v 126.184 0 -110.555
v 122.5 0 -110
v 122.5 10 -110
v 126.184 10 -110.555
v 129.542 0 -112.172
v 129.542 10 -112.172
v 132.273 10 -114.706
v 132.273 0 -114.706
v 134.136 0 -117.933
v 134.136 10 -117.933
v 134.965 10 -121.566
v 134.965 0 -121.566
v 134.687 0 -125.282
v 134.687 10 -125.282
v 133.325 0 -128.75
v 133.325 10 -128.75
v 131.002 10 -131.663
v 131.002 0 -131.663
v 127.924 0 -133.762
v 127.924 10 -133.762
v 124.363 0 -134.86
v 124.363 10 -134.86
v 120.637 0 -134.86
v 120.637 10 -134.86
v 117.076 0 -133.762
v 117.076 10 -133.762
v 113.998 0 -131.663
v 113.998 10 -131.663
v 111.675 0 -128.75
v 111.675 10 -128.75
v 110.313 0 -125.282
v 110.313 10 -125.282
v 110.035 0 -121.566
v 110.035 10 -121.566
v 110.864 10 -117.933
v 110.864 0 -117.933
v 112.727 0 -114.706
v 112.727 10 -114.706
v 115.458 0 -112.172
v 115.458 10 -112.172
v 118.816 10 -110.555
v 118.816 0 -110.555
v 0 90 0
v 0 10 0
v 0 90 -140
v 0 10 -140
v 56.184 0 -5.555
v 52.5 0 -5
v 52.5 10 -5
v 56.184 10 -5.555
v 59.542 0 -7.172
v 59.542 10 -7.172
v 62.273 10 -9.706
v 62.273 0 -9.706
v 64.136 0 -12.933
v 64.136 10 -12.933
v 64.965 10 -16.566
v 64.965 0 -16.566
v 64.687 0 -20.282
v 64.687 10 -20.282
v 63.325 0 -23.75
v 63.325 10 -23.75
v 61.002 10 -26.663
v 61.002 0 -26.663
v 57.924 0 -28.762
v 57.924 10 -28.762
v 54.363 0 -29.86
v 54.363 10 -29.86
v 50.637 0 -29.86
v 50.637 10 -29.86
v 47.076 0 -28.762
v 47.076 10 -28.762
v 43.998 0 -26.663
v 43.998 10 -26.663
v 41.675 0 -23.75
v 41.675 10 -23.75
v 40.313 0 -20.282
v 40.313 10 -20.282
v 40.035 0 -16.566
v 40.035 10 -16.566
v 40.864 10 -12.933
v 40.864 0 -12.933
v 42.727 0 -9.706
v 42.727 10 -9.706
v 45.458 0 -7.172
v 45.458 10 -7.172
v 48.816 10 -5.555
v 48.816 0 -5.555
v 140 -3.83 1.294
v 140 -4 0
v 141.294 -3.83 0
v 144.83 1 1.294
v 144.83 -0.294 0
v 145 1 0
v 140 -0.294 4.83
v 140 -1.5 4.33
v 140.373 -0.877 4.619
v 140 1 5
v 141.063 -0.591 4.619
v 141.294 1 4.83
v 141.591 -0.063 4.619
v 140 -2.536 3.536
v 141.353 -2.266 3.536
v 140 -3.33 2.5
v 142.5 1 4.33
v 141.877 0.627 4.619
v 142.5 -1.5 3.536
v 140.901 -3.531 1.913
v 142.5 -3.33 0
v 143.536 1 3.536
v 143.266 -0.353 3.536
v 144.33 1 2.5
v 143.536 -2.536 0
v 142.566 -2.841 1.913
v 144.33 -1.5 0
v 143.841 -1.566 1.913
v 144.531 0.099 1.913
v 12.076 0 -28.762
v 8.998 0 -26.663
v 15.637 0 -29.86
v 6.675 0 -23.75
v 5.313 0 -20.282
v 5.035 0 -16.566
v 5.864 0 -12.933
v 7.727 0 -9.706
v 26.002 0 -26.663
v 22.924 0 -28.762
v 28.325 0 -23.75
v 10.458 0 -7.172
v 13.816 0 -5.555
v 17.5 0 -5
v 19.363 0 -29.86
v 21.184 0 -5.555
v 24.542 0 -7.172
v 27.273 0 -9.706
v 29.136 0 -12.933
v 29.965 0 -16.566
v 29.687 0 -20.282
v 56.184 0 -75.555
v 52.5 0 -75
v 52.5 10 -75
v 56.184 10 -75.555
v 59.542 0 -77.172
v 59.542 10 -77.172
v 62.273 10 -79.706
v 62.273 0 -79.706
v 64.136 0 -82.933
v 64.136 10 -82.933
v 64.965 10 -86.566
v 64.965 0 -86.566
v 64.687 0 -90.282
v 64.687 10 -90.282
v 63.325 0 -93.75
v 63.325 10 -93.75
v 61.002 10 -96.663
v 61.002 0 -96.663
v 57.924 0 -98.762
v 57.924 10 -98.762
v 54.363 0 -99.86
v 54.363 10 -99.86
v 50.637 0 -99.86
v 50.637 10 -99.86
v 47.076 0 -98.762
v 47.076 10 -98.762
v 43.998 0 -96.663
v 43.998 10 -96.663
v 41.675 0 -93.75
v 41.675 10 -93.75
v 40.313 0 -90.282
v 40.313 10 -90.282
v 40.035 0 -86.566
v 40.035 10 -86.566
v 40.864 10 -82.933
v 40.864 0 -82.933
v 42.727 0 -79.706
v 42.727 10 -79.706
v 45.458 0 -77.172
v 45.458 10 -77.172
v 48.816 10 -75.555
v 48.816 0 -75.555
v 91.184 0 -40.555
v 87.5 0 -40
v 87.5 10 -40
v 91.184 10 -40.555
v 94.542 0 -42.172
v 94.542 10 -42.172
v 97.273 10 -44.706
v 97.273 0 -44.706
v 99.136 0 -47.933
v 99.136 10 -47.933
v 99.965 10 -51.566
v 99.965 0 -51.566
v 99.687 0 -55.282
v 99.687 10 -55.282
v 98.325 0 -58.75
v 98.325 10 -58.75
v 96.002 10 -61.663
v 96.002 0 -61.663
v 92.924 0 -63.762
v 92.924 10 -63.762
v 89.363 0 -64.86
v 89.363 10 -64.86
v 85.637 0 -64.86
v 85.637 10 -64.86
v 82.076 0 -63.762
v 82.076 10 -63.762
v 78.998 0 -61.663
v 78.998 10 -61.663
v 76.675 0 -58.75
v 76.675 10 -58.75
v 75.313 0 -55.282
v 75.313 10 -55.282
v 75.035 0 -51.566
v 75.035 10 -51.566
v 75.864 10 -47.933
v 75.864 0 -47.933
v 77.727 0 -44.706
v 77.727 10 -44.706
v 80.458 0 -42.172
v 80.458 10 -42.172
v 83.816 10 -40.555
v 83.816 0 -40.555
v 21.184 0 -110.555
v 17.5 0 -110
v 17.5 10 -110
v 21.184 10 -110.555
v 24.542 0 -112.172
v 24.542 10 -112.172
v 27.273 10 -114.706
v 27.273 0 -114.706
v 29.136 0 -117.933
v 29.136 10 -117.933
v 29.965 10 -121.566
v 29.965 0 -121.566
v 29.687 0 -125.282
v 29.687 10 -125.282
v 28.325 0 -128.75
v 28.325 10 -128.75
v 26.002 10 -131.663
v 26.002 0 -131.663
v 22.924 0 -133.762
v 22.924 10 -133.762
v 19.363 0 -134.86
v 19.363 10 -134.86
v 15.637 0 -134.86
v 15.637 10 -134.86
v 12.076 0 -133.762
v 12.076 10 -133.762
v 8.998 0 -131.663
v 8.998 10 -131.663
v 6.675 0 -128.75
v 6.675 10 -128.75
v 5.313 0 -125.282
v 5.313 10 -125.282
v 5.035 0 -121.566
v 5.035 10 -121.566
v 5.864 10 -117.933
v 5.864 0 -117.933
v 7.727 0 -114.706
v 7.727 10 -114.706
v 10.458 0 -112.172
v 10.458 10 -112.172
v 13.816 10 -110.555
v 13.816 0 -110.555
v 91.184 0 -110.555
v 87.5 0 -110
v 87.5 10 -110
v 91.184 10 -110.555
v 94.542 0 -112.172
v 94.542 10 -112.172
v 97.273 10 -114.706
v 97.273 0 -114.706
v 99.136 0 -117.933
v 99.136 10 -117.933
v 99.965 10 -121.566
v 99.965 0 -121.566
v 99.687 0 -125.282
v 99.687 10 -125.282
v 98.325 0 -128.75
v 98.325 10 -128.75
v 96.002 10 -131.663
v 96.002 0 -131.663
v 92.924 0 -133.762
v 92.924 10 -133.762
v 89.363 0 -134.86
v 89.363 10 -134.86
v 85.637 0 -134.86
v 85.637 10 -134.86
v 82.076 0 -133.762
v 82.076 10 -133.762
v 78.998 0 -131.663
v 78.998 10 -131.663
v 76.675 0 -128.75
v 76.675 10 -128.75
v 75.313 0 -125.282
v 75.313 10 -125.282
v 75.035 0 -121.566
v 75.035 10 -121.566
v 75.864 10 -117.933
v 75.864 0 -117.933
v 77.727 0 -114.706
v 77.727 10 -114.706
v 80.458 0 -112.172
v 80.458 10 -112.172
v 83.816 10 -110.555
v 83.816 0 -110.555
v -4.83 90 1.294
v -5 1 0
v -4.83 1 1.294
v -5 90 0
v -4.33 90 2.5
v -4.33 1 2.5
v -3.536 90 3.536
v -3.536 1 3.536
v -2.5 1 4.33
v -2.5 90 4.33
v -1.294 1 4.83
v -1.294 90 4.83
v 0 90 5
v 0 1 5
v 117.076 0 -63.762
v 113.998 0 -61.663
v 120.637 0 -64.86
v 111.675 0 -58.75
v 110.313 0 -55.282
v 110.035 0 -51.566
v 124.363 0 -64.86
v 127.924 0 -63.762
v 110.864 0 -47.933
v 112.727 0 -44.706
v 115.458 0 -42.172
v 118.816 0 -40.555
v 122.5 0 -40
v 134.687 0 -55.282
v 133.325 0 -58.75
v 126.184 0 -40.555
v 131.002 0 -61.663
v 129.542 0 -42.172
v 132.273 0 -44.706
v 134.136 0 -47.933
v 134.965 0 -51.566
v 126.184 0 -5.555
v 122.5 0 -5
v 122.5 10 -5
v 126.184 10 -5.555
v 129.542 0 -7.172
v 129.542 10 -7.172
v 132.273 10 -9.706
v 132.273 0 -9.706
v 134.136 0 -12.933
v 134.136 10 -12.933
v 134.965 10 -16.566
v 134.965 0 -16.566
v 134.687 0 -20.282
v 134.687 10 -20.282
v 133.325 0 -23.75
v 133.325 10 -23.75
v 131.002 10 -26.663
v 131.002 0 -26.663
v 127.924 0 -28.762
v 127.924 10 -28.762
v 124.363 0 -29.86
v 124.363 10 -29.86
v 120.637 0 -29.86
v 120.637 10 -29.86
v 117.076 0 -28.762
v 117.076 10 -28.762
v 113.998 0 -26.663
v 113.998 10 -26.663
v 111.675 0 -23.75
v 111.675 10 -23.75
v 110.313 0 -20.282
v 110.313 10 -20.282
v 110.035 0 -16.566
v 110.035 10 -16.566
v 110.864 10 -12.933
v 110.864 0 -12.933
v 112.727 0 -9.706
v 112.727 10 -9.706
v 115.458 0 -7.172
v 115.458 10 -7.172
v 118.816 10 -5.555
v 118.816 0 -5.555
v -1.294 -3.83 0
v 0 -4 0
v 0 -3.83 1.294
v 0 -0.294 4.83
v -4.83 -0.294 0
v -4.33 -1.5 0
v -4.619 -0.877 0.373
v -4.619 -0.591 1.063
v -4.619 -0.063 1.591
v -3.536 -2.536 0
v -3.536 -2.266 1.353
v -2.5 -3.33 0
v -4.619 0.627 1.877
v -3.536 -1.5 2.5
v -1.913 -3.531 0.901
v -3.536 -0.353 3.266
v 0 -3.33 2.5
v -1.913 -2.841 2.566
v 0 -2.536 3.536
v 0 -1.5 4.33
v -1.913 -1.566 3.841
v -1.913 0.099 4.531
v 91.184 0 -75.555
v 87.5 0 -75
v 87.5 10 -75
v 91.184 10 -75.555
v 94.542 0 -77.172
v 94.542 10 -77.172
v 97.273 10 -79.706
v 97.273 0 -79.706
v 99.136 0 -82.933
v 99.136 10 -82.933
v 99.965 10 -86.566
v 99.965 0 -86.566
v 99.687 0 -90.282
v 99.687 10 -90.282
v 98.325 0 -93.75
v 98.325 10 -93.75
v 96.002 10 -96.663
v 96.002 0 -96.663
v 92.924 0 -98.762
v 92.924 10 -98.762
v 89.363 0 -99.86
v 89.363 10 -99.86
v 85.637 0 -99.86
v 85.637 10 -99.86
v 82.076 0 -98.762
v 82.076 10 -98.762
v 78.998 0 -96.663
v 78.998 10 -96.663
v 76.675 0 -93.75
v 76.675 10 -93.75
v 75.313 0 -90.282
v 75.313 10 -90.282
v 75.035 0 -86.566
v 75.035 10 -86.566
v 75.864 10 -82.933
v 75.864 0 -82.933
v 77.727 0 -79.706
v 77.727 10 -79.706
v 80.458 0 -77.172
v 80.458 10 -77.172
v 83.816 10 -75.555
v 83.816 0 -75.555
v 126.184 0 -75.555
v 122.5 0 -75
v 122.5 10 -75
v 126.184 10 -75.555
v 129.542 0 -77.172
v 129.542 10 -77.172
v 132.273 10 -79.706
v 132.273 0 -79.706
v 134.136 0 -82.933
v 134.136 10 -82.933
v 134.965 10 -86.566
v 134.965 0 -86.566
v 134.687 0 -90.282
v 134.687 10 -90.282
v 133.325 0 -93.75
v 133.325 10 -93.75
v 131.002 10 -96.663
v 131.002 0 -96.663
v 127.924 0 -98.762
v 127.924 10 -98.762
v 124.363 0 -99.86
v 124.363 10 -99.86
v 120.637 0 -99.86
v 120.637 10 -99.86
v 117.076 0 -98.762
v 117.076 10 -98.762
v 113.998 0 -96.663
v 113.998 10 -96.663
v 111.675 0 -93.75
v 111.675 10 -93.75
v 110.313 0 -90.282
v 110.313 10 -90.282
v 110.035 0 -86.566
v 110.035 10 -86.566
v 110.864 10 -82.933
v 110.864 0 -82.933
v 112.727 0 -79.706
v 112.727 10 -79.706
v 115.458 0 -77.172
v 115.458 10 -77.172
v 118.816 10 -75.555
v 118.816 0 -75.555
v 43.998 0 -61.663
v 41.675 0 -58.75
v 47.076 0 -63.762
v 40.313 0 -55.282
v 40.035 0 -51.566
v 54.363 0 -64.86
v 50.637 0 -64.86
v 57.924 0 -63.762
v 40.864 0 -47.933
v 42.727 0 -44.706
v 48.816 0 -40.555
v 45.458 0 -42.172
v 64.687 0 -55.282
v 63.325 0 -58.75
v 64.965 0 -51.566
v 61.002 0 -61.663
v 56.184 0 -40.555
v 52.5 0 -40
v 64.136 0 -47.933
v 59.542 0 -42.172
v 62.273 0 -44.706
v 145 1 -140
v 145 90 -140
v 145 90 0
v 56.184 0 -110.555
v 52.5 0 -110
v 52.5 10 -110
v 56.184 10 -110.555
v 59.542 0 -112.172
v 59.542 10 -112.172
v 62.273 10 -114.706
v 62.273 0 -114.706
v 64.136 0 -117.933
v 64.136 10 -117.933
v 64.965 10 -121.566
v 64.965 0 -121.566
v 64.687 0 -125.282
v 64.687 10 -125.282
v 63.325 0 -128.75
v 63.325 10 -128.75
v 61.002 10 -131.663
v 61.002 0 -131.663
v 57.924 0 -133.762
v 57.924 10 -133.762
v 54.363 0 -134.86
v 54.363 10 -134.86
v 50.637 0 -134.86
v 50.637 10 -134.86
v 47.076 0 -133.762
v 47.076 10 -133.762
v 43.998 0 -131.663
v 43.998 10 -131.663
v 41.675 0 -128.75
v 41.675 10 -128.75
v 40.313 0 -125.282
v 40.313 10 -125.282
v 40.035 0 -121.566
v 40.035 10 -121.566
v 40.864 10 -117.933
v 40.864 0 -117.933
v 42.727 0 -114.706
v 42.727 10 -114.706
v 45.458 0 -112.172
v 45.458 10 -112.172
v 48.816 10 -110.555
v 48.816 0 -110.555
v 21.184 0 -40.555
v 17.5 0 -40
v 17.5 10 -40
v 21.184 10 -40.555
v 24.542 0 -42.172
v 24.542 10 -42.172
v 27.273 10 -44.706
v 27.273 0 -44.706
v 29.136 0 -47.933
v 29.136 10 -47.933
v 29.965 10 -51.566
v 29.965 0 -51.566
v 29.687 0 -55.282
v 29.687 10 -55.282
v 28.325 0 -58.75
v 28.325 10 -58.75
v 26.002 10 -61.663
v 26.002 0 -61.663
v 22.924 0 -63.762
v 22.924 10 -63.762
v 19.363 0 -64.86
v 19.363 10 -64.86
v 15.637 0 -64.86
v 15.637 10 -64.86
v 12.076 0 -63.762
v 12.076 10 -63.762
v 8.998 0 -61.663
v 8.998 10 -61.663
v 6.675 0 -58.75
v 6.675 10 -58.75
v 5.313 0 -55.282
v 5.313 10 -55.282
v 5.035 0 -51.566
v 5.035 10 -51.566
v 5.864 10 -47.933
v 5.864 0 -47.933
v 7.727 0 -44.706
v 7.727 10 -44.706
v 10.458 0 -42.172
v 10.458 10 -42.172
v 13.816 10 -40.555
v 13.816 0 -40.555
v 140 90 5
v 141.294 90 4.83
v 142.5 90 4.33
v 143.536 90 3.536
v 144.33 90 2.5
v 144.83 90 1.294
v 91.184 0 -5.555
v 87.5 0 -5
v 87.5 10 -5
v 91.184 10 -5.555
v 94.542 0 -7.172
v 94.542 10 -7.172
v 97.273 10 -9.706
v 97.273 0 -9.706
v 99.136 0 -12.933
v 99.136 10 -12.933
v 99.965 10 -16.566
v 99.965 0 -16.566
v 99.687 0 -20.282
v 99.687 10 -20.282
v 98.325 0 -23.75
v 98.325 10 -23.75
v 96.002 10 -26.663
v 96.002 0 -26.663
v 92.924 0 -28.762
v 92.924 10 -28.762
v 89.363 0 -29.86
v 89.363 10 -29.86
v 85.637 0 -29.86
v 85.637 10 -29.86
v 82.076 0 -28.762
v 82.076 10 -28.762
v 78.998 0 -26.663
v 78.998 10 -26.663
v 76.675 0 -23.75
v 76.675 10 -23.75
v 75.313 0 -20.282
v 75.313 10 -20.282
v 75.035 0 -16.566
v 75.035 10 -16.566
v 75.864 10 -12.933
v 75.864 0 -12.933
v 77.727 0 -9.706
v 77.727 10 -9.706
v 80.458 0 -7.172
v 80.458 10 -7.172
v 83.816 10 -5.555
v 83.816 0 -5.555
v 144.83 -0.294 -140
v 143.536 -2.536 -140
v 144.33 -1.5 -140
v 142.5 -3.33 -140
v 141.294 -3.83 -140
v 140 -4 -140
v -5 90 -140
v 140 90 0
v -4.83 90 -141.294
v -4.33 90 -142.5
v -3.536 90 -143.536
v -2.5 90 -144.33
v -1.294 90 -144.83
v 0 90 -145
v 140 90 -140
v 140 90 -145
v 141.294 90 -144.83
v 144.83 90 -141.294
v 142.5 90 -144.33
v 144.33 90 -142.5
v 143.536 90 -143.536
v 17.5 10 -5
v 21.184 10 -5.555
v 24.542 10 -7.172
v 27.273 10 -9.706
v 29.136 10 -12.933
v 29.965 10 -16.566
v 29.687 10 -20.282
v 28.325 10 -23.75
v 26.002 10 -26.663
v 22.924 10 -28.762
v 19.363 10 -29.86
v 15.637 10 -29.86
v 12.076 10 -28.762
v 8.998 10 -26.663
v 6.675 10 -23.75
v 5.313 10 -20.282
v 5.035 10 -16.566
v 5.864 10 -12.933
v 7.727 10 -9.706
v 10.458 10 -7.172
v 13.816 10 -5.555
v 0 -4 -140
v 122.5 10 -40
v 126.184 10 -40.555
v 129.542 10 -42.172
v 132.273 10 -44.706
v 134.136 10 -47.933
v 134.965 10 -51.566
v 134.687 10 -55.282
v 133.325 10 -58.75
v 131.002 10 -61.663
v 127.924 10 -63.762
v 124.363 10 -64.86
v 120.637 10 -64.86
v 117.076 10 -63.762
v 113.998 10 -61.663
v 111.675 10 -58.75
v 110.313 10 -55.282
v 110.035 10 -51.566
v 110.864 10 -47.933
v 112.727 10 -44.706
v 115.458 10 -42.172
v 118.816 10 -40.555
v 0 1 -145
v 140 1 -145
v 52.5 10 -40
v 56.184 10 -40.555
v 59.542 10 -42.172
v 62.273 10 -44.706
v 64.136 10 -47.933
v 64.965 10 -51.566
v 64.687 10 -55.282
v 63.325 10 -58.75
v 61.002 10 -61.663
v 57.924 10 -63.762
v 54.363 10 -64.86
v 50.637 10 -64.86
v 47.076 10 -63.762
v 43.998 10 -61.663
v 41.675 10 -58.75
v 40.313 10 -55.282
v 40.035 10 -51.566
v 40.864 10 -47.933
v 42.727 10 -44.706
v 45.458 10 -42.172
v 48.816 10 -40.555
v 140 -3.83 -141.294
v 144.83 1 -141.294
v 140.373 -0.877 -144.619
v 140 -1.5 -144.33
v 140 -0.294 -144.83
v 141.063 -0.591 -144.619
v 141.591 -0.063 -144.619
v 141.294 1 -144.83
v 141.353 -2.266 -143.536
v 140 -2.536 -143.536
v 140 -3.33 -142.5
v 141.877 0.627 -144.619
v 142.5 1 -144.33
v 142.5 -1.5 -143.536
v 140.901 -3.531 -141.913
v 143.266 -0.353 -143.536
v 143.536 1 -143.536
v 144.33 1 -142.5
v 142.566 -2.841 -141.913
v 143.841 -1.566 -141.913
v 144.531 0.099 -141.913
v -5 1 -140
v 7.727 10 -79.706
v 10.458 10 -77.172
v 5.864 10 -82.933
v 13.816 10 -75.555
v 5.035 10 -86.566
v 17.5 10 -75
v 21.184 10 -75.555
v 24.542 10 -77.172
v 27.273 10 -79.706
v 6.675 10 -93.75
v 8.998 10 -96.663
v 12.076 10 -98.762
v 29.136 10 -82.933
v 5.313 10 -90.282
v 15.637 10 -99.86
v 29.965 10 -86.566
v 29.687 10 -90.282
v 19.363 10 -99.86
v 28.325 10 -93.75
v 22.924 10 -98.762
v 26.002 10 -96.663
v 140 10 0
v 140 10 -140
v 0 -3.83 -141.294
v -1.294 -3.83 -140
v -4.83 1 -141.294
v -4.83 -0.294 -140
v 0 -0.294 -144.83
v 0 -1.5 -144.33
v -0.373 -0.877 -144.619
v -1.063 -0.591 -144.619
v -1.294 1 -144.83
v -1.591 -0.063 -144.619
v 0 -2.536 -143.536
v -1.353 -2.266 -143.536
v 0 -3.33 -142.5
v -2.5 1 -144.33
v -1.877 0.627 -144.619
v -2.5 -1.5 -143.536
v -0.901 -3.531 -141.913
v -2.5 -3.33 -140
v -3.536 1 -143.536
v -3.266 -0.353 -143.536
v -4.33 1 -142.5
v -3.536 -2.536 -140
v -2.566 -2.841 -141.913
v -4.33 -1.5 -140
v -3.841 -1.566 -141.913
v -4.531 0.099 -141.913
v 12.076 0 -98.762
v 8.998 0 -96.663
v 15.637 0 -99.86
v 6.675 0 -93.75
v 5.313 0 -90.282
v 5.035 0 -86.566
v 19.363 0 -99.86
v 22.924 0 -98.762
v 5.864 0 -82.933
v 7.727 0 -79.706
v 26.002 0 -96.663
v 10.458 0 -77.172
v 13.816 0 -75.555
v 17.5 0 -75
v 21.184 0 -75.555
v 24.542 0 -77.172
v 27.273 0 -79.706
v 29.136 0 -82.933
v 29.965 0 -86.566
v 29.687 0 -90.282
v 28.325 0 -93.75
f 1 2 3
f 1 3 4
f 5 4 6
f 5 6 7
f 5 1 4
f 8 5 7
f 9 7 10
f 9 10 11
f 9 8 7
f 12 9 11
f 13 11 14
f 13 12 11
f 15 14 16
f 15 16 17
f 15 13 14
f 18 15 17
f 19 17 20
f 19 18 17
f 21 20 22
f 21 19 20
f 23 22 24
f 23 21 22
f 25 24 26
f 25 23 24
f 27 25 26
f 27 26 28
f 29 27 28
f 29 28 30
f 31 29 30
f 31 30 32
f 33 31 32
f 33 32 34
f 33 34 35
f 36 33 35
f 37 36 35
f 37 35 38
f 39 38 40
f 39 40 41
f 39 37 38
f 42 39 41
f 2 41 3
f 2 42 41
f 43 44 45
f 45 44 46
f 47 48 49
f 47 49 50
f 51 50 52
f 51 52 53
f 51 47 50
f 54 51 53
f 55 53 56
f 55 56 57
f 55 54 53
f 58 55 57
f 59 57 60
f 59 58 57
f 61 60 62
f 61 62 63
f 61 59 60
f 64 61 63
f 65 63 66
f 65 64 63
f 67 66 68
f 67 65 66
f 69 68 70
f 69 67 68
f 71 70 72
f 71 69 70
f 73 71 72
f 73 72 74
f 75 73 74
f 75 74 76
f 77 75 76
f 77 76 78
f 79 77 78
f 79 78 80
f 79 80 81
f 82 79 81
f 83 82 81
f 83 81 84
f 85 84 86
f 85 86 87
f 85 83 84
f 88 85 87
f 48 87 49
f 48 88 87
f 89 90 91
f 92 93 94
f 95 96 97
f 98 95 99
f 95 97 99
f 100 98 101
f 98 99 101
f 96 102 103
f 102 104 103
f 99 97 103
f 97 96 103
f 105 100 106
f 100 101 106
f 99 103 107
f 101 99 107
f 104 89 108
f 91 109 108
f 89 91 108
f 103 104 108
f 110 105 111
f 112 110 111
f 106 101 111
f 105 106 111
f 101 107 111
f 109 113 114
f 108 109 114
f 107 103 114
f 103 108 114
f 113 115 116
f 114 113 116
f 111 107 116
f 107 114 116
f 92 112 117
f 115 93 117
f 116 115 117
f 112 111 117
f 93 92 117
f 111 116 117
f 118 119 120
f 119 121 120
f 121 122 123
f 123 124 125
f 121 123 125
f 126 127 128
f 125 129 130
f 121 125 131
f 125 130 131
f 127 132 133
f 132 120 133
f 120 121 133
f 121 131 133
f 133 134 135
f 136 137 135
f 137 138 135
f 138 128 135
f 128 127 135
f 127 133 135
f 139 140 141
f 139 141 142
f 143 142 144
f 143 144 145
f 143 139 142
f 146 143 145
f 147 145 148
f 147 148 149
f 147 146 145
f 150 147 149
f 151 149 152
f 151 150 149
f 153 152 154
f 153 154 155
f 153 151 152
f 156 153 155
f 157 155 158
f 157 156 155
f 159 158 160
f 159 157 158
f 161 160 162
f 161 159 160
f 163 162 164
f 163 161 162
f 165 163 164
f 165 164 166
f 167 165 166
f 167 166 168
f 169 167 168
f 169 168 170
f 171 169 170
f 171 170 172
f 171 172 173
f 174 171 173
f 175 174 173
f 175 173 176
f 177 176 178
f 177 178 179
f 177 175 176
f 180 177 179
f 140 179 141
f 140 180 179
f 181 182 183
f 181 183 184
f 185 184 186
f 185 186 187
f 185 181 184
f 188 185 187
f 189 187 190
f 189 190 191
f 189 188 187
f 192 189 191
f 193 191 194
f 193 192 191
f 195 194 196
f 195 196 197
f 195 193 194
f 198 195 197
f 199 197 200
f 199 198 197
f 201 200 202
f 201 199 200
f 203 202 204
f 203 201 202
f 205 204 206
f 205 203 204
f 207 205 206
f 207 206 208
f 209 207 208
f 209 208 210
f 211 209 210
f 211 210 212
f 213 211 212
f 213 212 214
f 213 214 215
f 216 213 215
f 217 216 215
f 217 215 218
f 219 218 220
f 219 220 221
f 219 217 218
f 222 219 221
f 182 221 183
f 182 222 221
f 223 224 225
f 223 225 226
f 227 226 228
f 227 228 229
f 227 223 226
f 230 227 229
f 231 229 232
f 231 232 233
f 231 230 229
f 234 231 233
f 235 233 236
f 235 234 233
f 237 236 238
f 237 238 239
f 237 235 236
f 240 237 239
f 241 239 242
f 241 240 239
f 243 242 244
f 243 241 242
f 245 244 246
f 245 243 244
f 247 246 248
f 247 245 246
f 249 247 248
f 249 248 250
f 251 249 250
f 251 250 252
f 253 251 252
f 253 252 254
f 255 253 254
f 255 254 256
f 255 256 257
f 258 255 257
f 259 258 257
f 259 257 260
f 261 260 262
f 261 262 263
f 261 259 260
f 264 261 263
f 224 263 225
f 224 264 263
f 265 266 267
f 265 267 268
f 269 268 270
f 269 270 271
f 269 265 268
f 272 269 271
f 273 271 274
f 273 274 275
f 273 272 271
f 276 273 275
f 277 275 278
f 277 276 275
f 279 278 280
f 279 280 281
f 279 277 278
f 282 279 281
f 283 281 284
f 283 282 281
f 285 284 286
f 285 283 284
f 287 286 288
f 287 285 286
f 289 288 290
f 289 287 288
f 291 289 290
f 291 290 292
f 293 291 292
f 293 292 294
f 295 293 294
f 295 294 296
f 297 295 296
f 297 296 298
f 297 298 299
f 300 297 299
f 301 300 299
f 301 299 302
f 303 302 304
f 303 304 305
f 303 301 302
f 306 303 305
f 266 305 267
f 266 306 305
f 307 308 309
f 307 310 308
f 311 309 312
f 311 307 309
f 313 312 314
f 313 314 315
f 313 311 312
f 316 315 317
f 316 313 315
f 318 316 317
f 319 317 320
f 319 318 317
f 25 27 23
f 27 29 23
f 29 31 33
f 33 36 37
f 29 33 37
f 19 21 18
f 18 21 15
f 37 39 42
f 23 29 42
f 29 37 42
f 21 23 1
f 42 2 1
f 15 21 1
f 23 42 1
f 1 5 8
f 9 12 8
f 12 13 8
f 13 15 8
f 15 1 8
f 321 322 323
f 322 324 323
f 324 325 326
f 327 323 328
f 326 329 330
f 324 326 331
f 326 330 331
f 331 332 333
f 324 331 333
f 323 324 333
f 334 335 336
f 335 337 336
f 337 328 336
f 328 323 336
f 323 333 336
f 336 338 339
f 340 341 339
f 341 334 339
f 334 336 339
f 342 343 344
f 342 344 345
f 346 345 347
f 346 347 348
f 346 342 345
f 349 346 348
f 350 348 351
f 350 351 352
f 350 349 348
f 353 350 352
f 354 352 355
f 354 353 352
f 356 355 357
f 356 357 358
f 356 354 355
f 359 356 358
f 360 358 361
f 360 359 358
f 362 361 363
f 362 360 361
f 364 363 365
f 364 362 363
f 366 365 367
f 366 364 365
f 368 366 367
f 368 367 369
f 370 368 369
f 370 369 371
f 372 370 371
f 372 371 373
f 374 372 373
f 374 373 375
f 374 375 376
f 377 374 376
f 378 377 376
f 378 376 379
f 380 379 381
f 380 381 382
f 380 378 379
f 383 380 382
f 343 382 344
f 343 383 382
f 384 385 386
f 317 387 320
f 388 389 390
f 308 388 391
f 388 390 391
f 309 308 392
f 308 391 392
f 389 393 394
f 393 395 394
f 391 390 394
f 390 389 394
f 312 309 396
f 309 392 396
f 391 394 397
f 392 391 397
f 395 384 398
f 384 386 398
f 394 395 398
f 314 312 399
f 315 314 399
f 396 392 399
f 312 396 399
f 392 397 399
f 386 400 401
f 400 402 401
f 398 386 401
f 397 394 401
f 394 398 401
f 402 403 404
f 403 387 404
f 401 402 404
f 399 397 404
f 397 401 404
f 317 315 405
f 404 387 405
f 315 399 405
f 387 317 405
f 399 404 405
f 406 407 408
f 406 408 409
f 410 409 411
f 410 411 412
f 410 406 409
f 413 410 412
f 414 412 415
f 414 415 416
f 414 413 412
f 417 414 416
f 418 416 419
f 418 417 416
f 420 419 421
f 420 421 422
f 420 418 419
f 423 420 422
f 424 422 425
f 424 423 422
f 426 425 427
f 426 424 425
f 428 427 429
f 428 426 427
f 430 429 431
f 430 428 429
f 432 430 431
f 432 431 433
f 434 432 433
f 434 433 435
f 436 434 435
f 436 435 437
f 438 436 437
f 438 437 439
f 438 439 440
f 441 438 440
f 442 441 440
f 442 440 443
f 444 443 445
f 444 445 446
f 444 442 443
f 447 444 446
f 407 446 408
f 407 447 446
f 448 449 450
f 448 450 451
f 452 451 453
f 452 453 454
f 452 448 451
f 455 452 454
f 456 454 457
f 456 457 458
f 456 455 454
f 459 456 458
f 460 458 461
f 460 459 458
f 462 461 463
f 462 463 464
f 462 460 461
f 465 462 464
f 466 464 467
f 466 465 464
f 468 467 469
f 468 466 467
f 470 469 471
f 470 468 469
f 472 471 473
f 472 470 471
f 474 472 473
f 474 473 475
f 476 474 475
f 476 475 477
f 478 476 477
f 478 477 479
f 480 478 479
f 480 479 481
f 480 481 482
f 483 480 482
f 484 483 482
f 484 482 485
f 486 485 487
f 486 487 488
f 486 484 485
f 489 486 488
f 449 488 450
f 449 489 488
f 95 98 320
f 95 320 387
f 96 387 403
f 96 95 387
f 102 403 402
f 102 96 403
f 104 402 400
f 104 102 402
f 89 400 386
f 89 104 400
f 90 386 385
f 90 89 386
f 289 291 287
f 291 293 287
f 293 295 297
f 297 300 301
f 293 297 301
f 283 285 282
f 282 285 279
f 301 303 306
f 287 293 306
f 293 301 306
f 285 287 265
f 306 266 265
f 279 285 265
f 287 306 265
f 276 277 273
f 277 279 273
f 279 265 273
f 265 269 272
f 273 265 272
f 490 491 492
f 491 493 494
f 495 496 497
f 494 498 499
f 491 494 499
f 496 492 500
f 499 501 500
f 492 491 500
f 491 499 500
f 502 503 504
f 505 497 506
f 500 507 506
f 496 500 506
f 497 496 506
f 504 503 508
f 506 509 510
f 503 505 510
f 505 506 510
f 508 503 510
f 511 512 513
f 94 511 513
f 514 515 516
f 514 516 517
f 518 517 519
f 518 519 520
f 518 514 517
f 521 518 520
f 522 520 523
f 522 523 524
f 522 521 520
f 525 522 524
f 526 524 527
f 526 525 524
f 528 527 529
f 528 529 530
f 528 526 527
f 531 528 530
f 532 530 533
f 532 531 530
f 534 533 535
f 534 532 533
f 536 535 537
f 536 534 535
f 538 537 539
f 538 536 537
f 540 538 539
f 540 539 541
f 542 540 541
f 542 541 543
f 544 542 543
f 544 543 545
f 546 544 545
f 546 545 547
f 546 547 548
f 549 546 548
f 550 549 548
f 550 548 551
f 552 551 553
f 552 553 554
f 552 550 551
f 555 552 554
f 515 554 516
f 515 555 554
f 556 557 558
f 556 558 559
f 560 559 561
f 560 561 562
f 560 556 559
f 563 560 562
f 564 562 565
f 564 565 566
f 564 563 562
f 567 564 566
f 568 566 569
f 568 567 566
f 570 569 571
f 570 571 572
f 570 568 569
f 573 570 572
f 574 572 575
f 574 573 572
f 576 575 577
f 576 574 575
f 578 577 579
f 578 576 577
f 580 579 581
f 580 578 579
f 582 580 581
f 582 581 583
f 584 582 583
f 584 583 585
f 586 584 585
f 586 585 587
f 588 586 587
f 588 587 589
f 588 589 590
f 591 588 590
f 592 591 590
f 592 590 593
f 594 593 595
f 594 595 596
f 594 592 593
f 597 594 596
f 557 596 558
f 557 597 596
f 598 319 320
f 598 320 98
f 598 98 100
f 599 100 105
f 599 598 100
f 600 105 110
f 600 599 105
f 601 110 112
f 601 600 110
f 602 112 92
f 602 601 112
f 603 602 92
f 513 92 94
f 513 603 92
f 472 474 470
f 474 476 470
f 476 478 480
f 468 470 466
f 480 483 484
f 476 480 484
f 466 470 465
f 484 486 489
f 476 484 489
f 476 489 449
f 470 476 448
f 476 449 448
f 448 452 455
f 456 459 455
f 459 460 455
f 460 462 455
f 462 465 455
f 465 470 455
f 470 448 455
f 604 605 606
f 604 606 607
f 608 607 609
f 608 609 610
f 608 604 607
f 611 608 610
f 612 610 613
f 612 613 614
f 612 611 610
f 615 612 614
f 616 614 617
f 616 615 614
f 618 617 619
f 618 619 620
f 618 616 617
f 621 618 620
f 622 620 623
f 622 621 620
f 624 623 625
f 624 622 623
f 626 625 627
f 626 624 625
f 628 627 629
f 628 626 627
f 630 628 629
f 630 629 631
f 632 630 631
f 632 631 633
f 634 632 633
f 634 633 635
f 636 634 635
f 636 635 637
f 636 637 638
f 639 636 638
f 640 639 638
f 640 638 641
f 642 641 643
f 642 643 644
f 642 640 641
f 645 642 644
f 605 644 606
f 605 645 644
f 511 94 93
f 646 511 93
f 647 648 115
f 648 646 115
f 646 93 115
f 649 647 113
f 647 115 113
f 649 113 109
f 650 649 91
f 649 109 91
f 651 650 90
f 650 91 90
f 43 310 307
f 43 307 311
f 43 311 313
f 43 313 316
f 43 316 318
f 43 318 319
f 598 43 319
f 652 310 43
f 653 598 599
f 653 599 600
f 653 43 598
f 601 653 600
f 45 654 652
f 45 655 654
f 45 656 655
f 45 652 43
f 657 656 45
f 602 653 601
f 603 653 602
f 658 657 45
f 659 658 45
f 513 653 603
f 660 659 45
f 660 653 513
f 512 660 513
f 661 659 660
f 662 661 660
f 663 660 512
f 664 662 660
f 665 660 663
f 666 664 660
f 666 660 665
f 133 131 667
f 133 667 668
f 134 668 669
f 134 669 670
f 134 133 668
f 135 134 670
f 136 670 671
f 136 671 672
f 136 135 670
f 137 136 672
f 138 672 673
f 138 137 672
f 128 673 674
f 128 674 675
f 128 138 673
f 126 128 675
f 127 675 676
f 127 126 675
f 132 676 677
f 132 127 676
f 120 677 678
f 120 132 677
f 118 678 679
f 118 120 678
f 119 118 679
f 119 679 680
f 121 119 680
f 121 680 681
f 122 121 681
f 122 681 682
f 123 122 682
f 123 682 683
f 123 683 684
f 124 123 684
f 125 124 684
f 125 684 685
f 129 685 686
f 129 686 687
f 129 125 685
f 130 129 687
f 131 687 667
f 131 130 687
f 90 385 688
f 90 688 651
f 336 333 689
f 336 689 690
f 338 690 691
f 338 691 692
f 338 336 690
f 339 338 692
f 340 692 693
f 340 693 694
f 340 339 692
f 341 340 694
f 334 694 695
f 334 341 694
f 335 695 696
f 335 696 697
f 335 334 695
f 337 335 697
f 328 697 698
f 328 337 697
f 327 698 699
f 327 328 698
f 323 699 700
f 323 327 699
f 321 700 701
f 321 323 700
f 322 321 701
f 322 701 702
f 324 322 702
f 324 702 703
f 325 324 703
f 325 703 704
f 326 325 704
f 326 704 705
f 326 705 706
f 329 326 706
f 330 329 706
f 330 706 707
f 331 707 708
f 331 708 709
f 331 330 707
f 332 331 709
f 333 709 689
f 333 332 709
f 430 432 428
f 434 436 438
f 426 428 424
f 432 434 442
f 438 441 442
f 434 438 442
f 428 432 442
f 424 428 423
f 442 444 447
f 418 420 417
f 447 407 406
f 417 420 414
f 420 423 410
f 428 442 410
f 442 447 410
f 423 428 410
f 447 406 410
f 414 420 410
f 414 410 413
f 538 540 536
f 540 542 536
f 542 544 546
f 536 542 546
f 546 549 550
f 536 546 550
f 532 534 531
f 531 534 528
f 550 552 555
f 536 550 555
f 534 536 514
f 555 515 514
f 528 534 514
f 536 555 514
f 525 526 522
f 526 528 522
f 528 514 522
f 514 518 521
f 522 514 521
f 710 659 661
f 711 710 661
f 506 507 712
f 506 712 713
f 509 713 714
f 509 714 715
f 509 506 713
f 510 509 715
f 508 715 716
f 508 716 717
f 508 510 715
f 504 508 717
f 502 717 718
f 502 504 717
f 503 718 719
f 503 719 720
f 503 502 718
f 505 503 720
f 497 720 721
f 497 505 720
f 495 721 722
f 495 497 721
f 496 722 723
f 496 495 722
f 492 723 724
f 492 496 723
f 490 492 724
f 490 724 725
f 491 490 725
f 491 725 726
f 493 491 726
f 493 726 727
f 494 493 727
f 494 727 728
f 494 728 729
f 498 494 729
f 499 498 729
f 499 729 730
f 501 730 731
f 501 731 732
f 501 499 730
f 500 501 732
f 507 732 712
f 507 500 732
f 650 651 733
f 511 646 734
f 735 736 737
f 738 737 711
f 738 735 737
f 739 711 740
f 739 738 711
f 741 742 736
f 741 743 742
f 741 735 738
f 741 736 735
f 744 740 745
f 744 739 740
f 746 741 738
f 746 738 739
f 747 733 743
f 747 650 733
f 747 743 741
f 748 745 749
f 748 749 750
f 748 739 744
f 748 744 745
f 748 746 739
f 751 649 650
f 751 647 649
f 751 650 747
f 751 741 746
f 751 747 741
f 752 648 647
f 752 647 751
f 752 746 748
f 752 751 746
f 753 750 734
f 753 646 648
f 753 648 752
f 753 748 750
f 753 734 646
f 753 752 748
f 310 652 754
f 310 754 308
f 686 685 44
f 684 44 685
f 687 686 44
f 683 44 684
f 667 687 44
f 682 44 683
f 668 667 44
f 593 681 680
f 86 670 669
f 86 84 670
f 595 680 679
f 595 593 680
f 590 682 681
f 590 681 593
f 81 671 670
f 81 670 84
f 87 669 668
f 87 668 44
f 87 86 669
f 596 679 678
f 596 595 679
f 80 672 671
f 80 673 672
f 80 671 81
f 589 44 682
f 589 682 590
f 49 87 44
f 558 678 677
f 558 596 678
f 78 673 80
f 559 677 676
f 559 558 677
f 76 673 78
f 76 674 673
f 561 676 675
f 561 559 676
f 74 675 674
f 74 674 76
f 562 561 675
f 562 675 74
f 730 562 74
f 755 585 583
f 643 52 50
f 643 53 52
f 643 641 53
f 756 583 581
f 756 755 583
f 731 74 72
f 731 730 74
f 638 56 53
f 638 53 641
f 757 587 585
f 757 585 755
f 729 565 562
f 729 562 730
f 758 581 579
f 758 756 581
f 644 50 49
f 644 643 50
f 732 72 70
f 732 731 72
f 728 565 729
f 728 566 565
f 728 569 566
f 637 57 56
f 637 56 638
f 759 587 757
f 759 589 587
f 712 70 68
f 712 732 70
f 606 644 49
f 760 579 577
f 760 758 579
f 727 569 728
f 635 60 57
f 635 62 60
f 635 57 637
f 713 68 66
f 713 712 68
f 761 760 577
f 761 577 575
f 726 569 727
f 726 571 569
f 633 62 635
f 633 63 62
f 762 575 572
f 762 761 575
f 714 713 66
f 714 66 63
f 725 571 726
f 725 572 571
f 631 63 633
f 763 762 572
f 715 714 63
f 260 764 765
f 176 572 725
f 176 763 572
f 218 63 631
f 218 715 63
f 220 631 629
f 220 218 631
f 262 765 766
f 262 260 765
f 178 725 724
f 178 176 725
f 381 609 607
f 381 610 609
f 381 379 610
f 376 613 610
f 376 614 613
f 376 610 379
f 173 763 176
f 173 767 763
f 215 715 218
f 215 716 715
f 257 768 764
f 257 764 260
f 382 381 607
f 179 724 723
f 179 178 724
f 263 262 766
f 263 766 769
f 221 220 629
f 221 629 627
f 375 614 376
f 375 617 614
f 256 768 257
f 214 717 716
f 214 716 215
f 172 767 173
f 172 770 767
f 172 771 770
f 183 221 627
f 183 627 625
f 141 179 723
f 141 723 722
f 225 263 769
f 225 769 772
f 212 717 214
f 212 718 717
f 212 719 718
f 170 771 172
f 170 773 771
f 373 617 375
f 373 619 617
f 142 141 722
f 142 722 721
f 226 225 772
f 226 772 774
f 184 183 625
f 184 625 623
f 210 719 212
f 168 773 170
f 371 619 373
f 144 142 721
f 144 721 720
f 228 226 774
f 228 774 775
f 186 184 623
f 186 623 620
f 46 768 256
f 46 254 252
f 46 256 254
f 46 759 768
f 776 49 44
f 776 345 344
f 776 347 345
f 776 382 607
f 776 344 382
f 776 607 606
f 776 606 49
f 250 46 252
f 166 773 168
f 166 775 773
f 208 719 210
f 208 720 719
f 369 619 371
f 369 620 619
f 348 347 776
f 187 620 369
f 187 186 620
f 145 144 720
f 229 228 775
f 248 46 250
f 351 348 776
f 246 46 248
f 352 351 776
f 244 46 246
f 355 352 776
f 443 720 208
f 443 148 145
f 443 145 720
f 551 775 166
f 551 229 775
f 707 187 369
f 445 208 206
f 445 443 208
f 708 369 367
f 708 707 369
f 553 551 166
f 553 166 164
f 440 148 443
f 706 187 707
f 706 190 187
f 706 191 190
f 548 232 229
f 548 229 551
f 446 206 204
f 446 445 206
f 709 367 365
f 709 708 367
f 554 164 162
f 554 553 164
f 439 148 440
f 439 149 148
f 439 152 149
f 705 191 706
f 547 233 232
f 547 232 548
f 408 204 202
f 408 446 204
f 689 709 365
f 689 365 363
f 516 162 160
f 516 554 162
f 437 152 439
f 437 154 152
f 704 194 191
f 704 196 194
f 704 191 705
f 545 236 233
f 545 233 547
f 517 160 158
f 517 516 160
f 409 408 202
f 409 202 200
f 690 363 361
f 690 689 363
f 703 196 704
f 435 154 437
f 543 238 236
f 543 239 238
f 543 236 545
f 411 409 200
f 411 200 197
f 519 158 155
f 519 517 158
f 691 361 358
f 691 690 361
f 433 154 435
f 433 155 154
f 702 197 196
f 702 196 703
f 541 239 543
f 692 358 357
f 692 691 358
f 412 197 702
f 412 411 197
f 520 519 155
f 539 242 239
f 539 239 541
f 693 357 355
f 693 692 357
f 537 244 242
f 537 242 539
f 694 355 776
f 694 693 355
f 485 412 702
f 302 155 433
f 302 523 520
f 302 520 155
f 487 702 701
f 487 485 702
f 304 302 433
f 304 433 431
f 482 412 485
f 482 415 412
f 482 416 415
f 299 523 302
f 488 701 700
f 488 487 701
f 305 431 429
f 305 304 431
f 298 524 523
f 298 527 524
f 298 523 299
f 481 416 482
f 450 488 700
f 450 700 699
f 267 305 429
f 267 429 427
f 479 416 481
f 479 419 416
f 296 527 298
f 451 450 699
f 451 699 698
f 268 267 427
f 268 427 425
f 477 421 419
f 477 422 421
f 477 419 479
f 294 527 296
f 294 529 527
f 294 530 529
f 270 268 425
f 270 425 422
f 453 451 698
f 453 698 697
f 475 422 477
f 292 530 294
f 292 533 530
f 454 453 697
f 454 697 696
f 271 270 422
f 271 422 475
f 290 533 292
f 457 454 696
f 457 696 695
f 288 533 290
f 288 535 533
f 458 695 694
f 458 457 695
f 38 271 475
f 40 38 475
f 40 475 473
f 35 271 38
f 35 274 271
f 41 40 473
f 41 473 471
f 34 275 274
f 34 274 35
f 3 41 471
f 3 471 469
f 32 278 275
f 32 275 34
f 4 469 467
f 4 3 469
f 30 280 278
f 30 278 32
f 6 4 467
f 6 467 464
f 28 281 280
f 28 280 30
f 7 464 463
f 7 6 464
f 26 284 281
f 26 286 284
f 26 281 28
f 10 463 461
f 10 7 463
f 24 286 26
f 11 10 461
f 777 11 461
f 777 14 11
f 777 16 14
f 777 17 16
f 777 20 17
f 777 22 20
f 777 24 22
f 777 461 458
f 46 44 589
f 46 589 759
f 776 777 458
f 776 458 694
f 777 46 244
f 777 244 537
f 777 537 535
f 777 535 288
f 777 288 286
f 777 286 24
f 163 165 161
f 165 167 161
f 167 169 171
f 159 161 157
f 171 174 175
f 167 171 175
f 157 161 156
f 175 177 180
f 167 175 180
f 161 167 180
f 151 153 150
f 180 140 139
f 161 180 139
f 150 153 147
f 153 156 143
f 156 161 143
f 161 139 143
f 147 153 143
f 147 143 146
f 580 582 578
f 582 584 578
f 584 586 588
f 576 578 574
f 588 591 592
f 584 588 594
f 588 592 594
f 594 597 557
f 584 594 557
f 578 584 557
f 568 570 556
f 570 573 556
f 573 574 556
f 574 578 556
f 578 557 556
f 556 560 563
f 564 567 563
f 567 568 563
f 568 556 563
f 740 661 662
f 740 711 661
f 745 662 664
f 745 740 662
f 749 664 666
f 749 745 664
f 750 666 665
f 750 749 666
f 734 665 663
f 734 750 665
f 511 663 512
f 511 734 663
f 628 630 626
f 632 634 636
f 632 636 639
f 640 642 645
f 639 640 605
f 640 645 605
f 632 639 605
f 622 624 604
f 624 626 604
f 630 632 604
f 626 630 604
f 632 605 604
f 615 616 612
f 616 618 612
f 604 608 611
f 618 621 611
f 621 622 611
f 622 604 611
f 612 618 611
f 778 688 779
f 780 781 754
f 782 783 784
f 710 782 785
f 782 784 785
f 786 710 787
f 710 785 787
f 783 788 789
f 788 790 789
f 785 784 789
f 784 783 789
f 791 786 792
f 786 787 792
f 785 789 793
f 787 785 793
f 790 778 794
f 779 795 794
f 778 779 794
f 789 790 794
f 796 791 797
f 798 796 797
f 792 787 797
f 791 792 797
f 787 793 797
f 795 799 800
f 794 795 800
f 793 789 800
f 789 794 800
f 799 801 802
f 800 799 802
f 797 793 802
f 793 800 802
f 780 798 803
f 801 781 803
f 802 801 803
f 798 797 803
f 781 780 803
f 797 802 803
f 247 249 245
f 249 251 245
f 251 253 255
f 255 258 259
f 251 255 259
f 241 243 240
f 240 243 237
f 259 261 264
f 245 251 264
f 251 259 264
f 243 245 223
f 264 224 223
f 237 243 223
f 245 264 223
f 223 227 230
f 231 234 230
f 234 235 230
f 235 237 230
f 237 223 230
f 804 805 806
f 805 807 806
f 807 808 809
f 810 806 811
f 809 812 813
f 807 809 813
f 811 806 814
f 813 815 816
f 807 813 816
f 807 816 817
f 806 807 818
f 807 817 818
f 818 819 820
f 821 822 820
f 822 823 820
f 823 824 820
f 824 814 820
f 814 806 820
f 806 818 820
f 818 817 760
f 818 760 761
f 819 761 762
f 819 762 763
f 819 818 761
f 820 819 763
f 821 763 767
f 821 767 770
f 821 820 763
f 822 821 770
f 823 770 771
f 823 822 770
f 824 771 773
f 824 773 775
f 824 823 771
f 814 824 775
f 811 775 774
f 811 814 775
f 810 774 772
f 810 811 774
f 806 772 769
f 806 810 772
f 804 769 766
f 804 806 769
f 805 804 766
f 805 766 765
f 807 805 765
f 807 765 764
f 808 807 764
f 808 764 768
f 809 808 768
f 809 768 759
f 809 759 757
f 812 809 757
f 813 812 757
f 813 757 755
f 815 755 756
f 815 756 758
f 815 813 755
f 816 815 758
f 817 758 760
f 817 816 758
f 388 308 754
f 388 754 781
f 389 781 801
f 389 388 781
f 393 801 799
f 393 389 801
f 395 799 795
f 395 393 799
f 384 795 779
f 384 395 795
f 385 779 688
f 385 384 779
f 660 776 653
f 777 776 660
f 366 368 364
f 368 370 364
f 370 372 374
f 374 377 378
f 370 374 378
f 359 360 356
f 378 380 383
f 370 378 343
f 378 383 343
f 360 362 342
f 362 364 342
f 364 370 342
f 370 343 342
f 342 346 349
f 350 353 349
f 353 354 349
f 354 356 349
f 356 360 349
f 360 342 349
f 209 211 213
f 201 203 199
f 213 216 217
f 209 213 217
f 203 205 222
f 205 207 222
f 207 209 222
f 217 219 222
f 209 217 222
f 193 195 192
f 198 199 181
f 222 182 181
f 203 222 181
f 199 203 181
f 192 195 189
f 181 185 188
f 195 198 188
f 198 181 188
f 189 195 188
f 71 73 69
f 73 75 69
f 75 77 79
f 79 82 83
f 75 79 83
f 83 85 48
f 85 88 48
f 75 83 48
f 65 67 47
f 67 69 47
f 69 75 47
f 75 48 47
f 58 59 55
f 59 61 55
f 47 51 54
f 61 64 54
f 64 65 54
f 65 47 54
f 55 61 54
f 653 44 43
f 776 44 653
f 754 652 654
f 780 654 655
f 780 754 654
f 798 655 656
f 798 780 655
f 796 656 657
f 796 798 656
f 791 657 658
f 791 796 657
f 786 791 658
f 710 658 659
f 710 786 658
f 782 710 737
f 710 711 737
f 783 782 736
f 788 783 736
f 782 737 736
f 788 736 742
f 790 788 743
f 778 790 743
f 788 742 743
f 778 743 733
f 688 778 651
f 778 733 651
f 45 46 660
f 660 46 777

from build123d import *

# Parameters (mm, degrees)
SKETCH1_W           = 150
SKETCH1_H           = 150
SKETCH1_W_2         = 140
SKETCH1_H_2         = 140
BOSS_EXTRUDE1_DEPTH = 90
SKETCH2_W           = 150
SKETCH2_H           = 150
BOSS_EXTRUDE2_DEPTH = 4
SKETCH3_W           = 140
SKETCH3_H           = 140
SKETCH3_R           = 12.5
BOSS_EXTRUDE3_DEPTH = 10
FILLET1_R           = 5


with BuildPart() as part:
    # Sketch1 → Boss-Extrude1 (new body)
    with BuildSketch(Plane(origin=(0, 0, 0), x_dir=(1, 0, 0), z_dir=(0, 1, 0))):
        with Locations((70, 70)):
            Rectangle(SKETCH1_W, SKETCH1_H)
        with Locations((70, 70)):
            Rectangle(SKETCH1_W_2, SKETCH1_H_2, mode=Mode.SUBTRACT)
    extrude(amount=BOSS_EXTRUDE1_DEPTH)

    # Sketch2 → Boss-Extrude2 (add)
    with BuildSketch(Plane.XZ):
        with Locations((70, -70)):
            Rectangle(SKETCH2_W, SKETCH2_H)
    extrude(amount=BOSS_EXTRUDE2_DEPTH)

    # Sketch3 → Boss-Extrude3 (add)
    with BuildSketch(Plane(origin=(0, 0, 0), x_dir=(1, 0, 0), z_dir=(0, 1, 0))):
        with Locations((70, 70)):
            Rectangle(SKETCH3_W, SKETCH3_H)
        with Locations(Location((17.5, 17.5, 0), (0, 0, 270))):
            Circle(SKETCH3_R, mode=Mode.SUBTRACT)
        with Locations(Location((17.5, 52.5, 0), (0, 0, 270))):
            Circle(SKETCH3_R, mode=Mode.SUBTRACT)
        with Locations(Location((17.5, 87.5, 0), (0, 0, 270))):
            Circle(SKETCH3_R, mode=Mode.SUBTRACT)
        with Locations(Location((122.5, 17.5, 0), (0, 0, 270))):
            Circle(SKETCH3_R, mode=Mode.SUBTRACT)
        with Locations(Location((87.5, 17.5, 0), (0, 0, 270))):
            Circle(SKETCH3_R, mode=Mode.SUBTRACT)
        with Locations(Location((52.5, 17.5, 0), (0, 0, 270))):
            Circle(SKETCH3_R, mode=Mode.SUBTRACT)
        with Locations(Location((122.5, 52.5, 0), (0, 0, 270))):
            Circle(SKETCH3_R, mode=Mode.SUBTRACT)
        with Locations(Location((87.5, 52.5, 0), (0, 0, 270))):
            Circle(SKETCH3_R, mode=Mode.SUBTRACT)
        with Locations(Location((52.5, 52.5, 0), (0, 0, 270))):
            Circle(SKETCH3_R, mode=Mode.SUBTRACT)
        with Locations(Location((122.5, 87.5, 0), (0, 0, 270))):
            Circle(SKETCH3_R, mode=Mode.SUBTRACT)
        with Locations(Location((87.5, 87.5, 0), (0, 0, 270))):
            Circle(SKETCH3_R, mode=Mode.SUBTRACT)
        with Locations(Location((52.5, 87.5, 0), (0, 0, 270))):
            Circle(SKETCH3_R, mode=Mode.SUBTRACT)
        with Locations(Location((122.5, 122.5, 0), (0, 0, 270))):
            Circle(SKETCH3_R, mode=Mode.SUBTRACT)
        with Locations(Location((87.5, 122.5, 0), (0, 0, 270))):
            Circle(SKETCH3_R, mode=Mode.SUBTRACT)
        with Locations(Location((52.5, 122.5, 0), (0, 0, 270))):
            Circle(SKETCH3_R, mode=Mode.SUBTRACT)
        with Locations(Location((17.5, 122.5, 0), (0, 0, 270))):
            Circle(SKETCH3_R, mode=Mode.SUBTRACT)
    extrude(amount=BOSS_EXTRUDE3_DEPTH)

    # Fillet1
    fillet1_edges = [part.edges().sort_by_distance(p)[0] for p in [
        (145, -4, -70),
        (70, -4, 5),
        (-5, -4, -70),
        (70, -4, -145),
        (-5, 43, -145),
        (145, 43, -145),
        (145, 43, 5),
        (-5, 43, 5),
    ]]
    fillet(fillet1_edges, radius=FILLET1_R)


solid = part.part
